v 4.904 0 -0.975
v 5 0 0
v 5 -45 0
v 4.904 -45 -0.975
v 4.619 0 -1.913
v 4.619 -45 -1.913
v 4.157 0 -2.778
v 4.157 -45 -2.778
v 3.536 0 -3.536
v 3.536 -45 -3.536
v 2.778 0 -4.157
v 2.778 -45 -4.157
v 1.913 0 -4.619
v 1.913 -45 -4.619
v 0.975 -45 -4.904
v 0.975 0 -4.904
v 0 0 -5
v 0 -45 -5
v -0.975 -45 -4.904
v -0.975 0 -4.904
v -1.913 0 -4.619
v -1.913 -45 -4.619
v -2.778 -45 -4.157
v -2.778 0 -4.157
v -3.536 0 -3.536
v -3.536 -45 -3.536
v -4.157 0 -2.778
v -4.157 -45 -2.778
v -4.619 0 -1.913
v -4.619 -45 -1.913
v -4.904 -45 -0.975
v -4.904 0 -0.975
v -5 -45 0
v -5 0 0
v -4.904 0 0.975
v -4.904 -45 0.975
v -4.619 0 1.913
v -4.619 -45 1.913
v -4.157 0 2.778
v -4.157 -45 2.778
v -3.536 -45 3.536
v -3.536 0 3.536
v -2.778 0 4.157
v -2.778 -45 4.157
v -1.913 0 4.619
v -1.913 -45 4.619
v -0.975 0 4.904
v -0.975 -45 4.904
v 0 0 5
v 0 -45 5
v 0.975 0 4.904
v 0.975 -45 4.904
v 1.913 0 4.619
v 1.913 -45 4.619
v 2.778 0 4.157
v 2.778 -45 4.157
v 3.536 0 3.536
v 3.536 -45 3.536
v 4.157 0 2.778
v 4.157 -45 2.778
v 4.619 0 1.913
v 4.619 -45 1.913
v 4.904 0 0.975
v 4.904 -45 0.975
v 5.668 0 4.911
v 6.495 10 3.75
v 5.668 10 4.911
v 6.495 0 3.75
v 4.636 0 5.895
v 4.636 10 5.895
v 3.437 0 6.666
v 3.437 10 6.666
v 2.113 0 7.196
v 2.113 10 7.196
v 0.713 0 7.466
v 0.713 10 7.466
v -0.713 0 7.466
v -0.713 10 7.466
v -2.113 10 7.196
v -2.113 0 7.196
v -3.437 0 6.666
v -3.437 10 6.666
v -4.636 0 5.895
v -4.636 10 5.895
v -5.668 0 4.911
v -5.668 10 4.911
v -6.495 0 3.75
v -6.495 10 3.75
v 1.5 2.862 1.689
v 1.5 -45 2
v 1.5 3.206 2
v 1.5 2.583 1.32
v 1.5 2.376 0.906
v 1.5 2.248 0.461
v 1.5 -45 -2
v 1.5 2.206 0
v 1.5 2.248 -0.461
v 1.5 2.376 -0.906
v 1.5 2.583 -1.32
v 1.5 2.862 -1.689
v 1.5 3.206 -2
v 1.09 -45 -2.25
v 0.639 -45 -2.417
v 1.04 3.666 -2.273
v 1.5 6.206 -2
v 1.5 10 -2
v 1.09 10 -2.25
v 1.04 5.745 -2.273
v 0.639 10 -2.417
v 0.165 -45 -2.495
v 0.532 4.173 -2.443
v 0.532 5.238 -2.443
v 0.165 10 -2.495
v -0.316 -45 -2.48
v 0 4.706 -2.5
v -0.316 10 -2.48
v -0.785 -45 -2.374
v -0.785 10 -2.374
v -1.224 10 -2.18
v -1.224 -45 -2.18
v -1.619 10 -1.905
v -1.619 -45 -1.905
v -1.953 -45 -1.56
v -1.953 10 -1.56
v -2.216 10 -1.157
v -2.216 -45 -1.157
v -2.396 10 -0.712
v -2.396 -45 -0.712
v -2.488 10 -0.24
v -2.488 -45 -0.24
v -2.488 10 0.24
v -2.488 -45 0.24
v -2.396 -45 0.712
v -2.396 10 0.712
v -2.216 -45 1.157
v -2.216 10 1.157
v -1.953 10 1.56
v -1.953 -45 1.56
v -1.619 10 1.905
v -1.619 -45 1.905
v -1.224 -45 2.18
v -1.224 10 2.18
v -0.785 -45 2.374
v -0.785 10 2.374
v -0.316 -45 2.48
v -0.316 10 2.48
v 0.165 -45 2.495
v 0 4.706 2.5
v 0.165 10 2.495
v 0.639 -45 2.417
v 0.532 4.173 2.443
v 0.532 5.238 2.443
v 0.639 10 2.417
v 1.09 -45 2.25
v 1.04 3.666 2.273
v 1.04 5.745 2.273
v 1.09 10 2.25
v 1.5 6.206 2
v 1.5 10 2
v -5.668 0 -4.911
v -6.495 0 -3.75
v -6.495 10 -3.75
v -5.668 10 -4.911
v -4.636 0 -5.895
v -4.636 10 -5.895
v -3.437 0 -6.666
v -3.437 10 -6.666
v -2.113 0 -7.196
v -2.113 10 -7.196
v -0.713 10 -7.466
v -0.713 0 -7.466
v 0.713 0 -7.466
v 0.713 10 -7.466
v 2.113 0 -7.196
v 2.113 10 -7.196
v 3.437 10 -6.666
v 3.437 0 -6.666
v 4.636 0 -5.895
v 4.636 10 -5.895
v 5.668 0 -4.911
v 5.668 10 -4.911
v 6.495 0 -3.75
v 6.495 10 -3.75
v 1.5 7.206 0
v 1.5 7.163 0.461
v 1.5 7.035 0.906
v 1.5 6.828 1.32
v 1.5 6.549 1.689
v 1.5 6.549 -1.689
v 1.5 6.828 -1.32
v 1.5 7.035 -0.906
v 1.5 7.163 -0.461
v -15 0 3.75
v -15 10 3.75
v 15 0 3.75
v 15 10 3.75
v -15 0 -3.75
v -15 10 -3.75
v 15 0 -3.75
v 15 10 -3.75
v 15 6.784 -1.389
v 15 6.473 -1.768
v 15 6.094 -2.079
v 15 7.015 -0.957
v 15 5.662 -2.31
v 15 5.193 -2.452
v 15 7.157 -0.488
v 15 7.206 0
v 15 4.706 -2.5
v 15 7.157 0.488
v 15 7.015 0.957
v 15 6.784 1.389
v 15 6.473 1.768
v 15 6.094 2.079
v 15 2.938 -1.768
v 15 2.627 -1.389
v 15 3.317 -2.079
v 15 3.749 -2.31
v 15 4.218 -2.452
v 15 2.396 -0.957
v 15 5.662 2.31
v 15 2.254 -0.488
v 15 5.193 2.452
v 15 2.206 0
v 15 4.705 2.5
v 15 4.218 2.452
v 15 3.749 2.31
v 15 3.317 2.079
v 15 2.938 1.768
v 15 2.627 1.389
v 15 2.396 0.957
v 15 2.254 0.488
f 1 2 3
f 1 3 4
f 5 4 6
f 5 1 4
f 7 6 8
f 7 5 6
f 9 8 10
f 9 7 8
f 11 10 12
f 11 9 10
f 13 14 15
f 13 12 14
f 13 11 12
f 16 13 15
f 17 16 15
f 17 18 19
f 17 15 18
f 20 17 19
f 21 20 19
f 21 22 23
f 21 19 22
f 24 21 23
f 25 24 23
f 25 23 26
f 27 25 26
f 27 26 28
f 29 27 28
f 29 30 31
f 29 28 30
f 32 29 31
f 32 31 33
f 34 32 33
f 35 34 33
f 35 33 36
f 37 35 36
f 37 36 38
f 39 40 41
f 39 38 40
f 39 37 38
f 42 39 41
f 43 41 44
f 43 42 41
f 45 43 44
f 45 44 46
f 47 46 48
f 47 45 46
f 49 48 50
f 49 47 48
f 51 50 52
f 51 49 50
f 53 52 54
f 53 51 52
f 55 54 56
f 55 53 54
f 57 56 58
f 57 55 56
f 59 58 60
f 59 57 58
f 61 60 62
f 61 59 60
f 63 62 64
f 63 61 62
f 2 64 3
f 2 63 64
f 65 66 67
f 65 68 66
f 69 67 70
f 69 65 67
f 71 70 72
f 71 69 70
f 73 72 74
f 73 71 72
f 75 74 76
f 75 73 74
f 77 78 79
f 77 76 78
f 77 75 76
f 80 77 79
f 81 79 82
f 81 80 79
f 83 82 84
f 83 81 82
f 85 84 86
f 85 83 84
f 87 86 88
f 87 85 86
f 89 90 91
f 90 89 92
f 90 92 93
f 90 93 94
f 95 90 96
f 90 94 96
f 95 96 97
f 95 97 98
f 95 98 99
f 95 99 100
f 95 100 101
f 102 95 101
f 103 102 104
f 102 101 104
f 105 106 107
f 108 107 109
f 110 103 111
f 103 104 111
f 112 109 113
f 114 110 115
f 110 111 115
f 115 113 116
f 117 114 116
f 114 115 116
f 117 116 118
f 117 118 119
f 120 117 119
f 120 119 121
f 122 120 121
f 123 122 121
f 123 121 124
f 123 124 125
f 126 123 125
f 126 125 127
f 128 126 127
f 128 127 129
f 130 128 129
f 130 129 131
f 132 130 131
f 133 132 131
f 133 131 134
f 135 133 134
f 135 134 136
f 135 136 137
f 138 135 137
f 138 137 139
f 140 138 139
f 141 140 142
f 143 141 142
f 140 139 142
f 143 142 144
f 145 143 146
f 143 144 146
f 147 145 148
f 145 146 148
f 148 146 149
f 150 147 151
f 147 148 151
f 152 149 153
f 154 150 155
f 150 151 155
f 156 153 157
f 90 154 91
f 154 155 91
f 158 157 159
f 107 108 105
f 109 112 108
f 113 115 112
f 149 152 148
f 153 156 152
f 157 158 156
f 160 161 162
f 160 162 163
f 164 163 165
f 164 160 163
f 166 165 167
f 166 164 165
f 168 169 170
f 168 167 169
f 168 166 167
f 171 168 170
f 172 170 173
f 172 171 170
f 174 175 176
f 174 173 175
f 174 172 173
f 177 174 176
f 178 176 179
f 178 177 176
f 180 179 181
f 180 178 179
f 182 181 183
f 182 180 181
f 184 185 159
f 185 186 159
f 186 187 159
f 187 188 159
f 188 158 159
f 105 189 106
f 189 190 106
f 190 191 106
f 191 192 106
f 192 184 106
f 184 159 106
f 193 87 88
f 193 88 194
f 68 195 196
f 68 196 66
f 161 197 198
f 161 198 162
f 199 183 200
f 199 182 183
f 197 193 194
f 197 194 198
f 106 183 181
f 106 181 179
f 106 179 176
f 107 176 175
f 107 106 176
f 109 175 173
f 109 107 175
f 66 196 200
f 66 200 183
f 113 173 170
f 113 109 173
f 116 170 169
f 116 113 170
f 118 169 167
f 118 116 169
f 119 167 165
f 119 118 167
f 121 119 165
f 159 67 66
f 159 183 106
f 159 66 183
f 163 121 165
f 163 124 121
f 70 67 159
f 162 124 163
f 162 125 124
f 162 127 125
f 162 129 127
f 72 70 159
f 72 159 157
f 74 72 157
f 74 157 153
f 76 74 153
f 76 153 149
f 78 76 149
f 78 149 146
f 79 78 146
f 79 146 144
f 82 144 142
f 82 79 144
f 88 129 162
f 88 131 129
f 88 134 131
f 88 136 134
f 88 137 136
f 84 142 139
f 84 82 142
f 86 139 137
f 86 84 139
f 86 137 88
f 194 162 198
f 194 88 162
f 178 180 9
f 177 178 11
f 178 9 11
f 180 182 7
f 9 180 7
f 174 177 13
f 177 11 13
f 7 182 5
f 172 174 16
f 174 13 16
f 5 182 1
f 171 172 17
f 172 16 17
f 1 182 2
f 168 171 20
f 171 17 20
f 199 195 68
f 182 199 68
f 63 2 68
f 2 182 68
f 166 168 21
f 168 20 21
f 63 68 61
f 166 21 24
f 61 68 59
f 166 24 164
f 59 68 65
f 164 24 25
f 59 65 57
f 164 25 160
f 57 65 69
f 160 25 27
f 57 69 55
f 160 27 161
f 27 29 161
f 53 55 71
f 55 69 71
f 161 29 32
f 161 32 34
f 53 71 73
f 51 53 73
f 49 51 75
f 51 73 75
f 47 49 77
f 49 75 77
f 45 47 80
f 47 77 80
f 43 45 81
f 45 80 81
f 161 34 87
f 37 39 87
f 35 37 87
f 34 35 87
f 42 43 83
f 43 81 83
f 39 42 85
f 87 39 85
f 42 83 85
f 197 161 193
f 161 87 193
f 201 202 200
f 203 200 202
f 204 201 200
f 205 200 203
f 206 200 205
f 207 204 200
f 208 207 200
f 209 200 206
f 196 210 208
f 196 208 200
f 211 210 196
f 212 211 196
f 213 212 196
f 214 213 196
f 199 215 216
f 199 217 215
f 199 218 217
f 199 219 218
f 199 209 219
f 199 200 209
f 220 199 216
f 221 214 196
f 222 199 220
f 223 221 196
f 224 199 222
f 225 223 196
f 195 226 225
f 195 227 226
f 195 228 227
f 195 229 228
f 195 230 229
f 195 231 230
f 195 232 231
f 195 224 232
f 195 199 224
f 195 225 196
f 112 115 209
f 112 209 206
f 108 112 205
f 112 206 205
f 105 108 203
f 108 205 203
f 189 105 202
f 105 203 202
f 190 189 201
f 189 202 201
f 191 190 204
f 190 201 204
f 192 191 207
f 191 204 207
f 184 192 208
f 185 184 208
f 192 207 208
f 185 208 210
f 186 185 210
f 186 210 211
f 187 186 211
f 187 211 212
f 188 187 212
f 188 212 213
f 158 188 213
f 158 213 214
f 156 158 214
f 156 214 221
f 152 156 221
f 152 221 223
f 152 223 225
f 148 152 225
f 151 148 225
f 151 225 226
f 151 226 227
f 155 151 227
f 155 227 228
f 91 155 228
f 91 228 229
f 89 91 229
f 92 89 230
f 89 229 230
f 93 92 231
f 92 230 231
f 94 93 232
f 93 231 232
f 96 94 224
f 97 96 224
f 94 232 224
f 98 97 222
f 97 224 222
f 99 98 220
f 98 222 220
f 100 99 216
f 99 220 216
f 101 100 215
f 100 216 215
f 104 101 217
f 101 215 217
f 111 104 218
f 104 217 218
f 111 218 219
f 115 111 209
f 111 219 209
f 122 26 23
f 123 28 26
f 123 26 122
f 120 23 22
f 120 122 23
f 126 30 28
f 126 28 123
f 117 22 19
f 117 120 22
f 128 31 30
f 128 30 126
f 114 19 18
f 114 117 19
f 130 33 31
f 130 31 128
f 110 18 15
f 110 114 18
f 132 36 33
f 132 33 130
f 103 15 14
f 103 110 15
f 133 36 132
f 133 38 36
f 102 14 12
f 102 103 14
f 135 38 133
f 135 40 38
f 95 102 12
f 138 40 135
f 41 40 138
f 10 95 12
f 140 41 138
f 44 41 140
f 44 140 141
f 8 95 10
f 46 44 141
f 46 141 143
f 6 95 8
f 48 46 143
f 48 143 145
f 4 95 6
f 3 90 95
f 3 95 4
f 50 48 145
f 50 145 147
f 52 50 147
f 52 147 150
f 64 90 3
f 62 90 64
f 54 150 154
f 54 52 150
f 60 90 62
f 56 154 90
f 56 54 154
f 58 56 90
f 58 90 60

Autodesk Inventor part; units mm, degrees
ref_plane "YZ Plane" through (0, 0, 0) normal (1, 0, 0) x (0, 1, 0)
ref_plane "XZ Plane" through (0, 0, 0) normal (0, 1, 0) x (-1, 0, 0)
ref_plane "XY Plane" through (0, 0, 0) normal (0, 0, 1) x (1, 0, 0)
sketch "Sketch3" plane through (0, 0, 0) normal (0, 1, 0) x (-1, 0, 0)
  circle A0 centre (0, 0) radius 7.5
  line L0 (0, 0) -> (15, 0)
  line L1 (0, 0) -> (15, 0) construction
  line L2 (15, 0) -> (15, -3.75)
  line L3 (15, -3.75) -> (-15, -3.75)
  line L4 (-15, -3.75) -> (-15, 3.75)
  line L5 (-15, 3.75) -> (15, 3.75)
  line L6 (15, 3.75) -> (15, -3.75)
  dimension "d27" = 15
  dimension "d28" = 15
  dimension "d29" = 0
  dimension "d30" = 3.75
  dimension "d31" = 90
  dimension "d32" = 30
  dimension "d33" = 7.5
extrude "Extrusion3" add sketch "Sketch3" along normal blind 10
sketch "Sketch5" plane through (0, 0, 0) normal (0, -1, 0) x (1, 0, 0)
  circle A0 centre (0, 0) radius 5
  line L0 (0, 2.5) -> (0, -2.5) projected
  dimension "d39" = 10
extrude "Extrusion5" add sketch "Sketch5" along normal blind 45
sketch "Sketch6" plane through (0, 10, 0) normal (0, 1, 0) x (1, 0, 0)
  circle A0 centre (0, 0) radius 2.5
  dimension "d44" = 5
extrude "Extrusion6" cut sketch "Sketch6" against normal blind 60
sketch "Sketch7" plane through (0, 10, 0) normal (0, 1, 0) x (1, 0, 0)
  line L0 (0, 0) -> (2.5, 0)
  line L1 (2.5, 0) -> (1.5, 0)
  line L2 (2.5, 0) -> (3.5, 0) construction
  line L3 (1.5, 0) -> (1.5, -3.2812)
  line L4 (1.5, -3.2812) -> (1.5, 3.3122)
  arc A0 (1.5, -2) -> (1.5, 2) centre (0, 0) ccw
  line L5 (1.5, -2) -> (1.5, 2)
  dimension "d50" = 1
  dimension "d51" = 180
extrude "Extrusion9" add sketch "Sketch7" against normal blind 55
sketch "Sketch8" plane through (15, 0, 3.75) normal (1, 0, 0) x (0, 0, -1)
  line L0 (0, 0) -> (0, 10) projected
  line L1 (0, 0) -> (7.5, 0) projected
  circle A0 centre (3.75, 4.7055) radius 2.5
  point P0 (3.75, 0)
  dimension "d58" = 5
extrude "Extrusion10" cut sketch "Sketch8" against normal blind 15
thread "Thread2" size "M5x0.8" class "6H" standard "ANSI Metric M Profile" full length
properties part number "Stepper_Key"
